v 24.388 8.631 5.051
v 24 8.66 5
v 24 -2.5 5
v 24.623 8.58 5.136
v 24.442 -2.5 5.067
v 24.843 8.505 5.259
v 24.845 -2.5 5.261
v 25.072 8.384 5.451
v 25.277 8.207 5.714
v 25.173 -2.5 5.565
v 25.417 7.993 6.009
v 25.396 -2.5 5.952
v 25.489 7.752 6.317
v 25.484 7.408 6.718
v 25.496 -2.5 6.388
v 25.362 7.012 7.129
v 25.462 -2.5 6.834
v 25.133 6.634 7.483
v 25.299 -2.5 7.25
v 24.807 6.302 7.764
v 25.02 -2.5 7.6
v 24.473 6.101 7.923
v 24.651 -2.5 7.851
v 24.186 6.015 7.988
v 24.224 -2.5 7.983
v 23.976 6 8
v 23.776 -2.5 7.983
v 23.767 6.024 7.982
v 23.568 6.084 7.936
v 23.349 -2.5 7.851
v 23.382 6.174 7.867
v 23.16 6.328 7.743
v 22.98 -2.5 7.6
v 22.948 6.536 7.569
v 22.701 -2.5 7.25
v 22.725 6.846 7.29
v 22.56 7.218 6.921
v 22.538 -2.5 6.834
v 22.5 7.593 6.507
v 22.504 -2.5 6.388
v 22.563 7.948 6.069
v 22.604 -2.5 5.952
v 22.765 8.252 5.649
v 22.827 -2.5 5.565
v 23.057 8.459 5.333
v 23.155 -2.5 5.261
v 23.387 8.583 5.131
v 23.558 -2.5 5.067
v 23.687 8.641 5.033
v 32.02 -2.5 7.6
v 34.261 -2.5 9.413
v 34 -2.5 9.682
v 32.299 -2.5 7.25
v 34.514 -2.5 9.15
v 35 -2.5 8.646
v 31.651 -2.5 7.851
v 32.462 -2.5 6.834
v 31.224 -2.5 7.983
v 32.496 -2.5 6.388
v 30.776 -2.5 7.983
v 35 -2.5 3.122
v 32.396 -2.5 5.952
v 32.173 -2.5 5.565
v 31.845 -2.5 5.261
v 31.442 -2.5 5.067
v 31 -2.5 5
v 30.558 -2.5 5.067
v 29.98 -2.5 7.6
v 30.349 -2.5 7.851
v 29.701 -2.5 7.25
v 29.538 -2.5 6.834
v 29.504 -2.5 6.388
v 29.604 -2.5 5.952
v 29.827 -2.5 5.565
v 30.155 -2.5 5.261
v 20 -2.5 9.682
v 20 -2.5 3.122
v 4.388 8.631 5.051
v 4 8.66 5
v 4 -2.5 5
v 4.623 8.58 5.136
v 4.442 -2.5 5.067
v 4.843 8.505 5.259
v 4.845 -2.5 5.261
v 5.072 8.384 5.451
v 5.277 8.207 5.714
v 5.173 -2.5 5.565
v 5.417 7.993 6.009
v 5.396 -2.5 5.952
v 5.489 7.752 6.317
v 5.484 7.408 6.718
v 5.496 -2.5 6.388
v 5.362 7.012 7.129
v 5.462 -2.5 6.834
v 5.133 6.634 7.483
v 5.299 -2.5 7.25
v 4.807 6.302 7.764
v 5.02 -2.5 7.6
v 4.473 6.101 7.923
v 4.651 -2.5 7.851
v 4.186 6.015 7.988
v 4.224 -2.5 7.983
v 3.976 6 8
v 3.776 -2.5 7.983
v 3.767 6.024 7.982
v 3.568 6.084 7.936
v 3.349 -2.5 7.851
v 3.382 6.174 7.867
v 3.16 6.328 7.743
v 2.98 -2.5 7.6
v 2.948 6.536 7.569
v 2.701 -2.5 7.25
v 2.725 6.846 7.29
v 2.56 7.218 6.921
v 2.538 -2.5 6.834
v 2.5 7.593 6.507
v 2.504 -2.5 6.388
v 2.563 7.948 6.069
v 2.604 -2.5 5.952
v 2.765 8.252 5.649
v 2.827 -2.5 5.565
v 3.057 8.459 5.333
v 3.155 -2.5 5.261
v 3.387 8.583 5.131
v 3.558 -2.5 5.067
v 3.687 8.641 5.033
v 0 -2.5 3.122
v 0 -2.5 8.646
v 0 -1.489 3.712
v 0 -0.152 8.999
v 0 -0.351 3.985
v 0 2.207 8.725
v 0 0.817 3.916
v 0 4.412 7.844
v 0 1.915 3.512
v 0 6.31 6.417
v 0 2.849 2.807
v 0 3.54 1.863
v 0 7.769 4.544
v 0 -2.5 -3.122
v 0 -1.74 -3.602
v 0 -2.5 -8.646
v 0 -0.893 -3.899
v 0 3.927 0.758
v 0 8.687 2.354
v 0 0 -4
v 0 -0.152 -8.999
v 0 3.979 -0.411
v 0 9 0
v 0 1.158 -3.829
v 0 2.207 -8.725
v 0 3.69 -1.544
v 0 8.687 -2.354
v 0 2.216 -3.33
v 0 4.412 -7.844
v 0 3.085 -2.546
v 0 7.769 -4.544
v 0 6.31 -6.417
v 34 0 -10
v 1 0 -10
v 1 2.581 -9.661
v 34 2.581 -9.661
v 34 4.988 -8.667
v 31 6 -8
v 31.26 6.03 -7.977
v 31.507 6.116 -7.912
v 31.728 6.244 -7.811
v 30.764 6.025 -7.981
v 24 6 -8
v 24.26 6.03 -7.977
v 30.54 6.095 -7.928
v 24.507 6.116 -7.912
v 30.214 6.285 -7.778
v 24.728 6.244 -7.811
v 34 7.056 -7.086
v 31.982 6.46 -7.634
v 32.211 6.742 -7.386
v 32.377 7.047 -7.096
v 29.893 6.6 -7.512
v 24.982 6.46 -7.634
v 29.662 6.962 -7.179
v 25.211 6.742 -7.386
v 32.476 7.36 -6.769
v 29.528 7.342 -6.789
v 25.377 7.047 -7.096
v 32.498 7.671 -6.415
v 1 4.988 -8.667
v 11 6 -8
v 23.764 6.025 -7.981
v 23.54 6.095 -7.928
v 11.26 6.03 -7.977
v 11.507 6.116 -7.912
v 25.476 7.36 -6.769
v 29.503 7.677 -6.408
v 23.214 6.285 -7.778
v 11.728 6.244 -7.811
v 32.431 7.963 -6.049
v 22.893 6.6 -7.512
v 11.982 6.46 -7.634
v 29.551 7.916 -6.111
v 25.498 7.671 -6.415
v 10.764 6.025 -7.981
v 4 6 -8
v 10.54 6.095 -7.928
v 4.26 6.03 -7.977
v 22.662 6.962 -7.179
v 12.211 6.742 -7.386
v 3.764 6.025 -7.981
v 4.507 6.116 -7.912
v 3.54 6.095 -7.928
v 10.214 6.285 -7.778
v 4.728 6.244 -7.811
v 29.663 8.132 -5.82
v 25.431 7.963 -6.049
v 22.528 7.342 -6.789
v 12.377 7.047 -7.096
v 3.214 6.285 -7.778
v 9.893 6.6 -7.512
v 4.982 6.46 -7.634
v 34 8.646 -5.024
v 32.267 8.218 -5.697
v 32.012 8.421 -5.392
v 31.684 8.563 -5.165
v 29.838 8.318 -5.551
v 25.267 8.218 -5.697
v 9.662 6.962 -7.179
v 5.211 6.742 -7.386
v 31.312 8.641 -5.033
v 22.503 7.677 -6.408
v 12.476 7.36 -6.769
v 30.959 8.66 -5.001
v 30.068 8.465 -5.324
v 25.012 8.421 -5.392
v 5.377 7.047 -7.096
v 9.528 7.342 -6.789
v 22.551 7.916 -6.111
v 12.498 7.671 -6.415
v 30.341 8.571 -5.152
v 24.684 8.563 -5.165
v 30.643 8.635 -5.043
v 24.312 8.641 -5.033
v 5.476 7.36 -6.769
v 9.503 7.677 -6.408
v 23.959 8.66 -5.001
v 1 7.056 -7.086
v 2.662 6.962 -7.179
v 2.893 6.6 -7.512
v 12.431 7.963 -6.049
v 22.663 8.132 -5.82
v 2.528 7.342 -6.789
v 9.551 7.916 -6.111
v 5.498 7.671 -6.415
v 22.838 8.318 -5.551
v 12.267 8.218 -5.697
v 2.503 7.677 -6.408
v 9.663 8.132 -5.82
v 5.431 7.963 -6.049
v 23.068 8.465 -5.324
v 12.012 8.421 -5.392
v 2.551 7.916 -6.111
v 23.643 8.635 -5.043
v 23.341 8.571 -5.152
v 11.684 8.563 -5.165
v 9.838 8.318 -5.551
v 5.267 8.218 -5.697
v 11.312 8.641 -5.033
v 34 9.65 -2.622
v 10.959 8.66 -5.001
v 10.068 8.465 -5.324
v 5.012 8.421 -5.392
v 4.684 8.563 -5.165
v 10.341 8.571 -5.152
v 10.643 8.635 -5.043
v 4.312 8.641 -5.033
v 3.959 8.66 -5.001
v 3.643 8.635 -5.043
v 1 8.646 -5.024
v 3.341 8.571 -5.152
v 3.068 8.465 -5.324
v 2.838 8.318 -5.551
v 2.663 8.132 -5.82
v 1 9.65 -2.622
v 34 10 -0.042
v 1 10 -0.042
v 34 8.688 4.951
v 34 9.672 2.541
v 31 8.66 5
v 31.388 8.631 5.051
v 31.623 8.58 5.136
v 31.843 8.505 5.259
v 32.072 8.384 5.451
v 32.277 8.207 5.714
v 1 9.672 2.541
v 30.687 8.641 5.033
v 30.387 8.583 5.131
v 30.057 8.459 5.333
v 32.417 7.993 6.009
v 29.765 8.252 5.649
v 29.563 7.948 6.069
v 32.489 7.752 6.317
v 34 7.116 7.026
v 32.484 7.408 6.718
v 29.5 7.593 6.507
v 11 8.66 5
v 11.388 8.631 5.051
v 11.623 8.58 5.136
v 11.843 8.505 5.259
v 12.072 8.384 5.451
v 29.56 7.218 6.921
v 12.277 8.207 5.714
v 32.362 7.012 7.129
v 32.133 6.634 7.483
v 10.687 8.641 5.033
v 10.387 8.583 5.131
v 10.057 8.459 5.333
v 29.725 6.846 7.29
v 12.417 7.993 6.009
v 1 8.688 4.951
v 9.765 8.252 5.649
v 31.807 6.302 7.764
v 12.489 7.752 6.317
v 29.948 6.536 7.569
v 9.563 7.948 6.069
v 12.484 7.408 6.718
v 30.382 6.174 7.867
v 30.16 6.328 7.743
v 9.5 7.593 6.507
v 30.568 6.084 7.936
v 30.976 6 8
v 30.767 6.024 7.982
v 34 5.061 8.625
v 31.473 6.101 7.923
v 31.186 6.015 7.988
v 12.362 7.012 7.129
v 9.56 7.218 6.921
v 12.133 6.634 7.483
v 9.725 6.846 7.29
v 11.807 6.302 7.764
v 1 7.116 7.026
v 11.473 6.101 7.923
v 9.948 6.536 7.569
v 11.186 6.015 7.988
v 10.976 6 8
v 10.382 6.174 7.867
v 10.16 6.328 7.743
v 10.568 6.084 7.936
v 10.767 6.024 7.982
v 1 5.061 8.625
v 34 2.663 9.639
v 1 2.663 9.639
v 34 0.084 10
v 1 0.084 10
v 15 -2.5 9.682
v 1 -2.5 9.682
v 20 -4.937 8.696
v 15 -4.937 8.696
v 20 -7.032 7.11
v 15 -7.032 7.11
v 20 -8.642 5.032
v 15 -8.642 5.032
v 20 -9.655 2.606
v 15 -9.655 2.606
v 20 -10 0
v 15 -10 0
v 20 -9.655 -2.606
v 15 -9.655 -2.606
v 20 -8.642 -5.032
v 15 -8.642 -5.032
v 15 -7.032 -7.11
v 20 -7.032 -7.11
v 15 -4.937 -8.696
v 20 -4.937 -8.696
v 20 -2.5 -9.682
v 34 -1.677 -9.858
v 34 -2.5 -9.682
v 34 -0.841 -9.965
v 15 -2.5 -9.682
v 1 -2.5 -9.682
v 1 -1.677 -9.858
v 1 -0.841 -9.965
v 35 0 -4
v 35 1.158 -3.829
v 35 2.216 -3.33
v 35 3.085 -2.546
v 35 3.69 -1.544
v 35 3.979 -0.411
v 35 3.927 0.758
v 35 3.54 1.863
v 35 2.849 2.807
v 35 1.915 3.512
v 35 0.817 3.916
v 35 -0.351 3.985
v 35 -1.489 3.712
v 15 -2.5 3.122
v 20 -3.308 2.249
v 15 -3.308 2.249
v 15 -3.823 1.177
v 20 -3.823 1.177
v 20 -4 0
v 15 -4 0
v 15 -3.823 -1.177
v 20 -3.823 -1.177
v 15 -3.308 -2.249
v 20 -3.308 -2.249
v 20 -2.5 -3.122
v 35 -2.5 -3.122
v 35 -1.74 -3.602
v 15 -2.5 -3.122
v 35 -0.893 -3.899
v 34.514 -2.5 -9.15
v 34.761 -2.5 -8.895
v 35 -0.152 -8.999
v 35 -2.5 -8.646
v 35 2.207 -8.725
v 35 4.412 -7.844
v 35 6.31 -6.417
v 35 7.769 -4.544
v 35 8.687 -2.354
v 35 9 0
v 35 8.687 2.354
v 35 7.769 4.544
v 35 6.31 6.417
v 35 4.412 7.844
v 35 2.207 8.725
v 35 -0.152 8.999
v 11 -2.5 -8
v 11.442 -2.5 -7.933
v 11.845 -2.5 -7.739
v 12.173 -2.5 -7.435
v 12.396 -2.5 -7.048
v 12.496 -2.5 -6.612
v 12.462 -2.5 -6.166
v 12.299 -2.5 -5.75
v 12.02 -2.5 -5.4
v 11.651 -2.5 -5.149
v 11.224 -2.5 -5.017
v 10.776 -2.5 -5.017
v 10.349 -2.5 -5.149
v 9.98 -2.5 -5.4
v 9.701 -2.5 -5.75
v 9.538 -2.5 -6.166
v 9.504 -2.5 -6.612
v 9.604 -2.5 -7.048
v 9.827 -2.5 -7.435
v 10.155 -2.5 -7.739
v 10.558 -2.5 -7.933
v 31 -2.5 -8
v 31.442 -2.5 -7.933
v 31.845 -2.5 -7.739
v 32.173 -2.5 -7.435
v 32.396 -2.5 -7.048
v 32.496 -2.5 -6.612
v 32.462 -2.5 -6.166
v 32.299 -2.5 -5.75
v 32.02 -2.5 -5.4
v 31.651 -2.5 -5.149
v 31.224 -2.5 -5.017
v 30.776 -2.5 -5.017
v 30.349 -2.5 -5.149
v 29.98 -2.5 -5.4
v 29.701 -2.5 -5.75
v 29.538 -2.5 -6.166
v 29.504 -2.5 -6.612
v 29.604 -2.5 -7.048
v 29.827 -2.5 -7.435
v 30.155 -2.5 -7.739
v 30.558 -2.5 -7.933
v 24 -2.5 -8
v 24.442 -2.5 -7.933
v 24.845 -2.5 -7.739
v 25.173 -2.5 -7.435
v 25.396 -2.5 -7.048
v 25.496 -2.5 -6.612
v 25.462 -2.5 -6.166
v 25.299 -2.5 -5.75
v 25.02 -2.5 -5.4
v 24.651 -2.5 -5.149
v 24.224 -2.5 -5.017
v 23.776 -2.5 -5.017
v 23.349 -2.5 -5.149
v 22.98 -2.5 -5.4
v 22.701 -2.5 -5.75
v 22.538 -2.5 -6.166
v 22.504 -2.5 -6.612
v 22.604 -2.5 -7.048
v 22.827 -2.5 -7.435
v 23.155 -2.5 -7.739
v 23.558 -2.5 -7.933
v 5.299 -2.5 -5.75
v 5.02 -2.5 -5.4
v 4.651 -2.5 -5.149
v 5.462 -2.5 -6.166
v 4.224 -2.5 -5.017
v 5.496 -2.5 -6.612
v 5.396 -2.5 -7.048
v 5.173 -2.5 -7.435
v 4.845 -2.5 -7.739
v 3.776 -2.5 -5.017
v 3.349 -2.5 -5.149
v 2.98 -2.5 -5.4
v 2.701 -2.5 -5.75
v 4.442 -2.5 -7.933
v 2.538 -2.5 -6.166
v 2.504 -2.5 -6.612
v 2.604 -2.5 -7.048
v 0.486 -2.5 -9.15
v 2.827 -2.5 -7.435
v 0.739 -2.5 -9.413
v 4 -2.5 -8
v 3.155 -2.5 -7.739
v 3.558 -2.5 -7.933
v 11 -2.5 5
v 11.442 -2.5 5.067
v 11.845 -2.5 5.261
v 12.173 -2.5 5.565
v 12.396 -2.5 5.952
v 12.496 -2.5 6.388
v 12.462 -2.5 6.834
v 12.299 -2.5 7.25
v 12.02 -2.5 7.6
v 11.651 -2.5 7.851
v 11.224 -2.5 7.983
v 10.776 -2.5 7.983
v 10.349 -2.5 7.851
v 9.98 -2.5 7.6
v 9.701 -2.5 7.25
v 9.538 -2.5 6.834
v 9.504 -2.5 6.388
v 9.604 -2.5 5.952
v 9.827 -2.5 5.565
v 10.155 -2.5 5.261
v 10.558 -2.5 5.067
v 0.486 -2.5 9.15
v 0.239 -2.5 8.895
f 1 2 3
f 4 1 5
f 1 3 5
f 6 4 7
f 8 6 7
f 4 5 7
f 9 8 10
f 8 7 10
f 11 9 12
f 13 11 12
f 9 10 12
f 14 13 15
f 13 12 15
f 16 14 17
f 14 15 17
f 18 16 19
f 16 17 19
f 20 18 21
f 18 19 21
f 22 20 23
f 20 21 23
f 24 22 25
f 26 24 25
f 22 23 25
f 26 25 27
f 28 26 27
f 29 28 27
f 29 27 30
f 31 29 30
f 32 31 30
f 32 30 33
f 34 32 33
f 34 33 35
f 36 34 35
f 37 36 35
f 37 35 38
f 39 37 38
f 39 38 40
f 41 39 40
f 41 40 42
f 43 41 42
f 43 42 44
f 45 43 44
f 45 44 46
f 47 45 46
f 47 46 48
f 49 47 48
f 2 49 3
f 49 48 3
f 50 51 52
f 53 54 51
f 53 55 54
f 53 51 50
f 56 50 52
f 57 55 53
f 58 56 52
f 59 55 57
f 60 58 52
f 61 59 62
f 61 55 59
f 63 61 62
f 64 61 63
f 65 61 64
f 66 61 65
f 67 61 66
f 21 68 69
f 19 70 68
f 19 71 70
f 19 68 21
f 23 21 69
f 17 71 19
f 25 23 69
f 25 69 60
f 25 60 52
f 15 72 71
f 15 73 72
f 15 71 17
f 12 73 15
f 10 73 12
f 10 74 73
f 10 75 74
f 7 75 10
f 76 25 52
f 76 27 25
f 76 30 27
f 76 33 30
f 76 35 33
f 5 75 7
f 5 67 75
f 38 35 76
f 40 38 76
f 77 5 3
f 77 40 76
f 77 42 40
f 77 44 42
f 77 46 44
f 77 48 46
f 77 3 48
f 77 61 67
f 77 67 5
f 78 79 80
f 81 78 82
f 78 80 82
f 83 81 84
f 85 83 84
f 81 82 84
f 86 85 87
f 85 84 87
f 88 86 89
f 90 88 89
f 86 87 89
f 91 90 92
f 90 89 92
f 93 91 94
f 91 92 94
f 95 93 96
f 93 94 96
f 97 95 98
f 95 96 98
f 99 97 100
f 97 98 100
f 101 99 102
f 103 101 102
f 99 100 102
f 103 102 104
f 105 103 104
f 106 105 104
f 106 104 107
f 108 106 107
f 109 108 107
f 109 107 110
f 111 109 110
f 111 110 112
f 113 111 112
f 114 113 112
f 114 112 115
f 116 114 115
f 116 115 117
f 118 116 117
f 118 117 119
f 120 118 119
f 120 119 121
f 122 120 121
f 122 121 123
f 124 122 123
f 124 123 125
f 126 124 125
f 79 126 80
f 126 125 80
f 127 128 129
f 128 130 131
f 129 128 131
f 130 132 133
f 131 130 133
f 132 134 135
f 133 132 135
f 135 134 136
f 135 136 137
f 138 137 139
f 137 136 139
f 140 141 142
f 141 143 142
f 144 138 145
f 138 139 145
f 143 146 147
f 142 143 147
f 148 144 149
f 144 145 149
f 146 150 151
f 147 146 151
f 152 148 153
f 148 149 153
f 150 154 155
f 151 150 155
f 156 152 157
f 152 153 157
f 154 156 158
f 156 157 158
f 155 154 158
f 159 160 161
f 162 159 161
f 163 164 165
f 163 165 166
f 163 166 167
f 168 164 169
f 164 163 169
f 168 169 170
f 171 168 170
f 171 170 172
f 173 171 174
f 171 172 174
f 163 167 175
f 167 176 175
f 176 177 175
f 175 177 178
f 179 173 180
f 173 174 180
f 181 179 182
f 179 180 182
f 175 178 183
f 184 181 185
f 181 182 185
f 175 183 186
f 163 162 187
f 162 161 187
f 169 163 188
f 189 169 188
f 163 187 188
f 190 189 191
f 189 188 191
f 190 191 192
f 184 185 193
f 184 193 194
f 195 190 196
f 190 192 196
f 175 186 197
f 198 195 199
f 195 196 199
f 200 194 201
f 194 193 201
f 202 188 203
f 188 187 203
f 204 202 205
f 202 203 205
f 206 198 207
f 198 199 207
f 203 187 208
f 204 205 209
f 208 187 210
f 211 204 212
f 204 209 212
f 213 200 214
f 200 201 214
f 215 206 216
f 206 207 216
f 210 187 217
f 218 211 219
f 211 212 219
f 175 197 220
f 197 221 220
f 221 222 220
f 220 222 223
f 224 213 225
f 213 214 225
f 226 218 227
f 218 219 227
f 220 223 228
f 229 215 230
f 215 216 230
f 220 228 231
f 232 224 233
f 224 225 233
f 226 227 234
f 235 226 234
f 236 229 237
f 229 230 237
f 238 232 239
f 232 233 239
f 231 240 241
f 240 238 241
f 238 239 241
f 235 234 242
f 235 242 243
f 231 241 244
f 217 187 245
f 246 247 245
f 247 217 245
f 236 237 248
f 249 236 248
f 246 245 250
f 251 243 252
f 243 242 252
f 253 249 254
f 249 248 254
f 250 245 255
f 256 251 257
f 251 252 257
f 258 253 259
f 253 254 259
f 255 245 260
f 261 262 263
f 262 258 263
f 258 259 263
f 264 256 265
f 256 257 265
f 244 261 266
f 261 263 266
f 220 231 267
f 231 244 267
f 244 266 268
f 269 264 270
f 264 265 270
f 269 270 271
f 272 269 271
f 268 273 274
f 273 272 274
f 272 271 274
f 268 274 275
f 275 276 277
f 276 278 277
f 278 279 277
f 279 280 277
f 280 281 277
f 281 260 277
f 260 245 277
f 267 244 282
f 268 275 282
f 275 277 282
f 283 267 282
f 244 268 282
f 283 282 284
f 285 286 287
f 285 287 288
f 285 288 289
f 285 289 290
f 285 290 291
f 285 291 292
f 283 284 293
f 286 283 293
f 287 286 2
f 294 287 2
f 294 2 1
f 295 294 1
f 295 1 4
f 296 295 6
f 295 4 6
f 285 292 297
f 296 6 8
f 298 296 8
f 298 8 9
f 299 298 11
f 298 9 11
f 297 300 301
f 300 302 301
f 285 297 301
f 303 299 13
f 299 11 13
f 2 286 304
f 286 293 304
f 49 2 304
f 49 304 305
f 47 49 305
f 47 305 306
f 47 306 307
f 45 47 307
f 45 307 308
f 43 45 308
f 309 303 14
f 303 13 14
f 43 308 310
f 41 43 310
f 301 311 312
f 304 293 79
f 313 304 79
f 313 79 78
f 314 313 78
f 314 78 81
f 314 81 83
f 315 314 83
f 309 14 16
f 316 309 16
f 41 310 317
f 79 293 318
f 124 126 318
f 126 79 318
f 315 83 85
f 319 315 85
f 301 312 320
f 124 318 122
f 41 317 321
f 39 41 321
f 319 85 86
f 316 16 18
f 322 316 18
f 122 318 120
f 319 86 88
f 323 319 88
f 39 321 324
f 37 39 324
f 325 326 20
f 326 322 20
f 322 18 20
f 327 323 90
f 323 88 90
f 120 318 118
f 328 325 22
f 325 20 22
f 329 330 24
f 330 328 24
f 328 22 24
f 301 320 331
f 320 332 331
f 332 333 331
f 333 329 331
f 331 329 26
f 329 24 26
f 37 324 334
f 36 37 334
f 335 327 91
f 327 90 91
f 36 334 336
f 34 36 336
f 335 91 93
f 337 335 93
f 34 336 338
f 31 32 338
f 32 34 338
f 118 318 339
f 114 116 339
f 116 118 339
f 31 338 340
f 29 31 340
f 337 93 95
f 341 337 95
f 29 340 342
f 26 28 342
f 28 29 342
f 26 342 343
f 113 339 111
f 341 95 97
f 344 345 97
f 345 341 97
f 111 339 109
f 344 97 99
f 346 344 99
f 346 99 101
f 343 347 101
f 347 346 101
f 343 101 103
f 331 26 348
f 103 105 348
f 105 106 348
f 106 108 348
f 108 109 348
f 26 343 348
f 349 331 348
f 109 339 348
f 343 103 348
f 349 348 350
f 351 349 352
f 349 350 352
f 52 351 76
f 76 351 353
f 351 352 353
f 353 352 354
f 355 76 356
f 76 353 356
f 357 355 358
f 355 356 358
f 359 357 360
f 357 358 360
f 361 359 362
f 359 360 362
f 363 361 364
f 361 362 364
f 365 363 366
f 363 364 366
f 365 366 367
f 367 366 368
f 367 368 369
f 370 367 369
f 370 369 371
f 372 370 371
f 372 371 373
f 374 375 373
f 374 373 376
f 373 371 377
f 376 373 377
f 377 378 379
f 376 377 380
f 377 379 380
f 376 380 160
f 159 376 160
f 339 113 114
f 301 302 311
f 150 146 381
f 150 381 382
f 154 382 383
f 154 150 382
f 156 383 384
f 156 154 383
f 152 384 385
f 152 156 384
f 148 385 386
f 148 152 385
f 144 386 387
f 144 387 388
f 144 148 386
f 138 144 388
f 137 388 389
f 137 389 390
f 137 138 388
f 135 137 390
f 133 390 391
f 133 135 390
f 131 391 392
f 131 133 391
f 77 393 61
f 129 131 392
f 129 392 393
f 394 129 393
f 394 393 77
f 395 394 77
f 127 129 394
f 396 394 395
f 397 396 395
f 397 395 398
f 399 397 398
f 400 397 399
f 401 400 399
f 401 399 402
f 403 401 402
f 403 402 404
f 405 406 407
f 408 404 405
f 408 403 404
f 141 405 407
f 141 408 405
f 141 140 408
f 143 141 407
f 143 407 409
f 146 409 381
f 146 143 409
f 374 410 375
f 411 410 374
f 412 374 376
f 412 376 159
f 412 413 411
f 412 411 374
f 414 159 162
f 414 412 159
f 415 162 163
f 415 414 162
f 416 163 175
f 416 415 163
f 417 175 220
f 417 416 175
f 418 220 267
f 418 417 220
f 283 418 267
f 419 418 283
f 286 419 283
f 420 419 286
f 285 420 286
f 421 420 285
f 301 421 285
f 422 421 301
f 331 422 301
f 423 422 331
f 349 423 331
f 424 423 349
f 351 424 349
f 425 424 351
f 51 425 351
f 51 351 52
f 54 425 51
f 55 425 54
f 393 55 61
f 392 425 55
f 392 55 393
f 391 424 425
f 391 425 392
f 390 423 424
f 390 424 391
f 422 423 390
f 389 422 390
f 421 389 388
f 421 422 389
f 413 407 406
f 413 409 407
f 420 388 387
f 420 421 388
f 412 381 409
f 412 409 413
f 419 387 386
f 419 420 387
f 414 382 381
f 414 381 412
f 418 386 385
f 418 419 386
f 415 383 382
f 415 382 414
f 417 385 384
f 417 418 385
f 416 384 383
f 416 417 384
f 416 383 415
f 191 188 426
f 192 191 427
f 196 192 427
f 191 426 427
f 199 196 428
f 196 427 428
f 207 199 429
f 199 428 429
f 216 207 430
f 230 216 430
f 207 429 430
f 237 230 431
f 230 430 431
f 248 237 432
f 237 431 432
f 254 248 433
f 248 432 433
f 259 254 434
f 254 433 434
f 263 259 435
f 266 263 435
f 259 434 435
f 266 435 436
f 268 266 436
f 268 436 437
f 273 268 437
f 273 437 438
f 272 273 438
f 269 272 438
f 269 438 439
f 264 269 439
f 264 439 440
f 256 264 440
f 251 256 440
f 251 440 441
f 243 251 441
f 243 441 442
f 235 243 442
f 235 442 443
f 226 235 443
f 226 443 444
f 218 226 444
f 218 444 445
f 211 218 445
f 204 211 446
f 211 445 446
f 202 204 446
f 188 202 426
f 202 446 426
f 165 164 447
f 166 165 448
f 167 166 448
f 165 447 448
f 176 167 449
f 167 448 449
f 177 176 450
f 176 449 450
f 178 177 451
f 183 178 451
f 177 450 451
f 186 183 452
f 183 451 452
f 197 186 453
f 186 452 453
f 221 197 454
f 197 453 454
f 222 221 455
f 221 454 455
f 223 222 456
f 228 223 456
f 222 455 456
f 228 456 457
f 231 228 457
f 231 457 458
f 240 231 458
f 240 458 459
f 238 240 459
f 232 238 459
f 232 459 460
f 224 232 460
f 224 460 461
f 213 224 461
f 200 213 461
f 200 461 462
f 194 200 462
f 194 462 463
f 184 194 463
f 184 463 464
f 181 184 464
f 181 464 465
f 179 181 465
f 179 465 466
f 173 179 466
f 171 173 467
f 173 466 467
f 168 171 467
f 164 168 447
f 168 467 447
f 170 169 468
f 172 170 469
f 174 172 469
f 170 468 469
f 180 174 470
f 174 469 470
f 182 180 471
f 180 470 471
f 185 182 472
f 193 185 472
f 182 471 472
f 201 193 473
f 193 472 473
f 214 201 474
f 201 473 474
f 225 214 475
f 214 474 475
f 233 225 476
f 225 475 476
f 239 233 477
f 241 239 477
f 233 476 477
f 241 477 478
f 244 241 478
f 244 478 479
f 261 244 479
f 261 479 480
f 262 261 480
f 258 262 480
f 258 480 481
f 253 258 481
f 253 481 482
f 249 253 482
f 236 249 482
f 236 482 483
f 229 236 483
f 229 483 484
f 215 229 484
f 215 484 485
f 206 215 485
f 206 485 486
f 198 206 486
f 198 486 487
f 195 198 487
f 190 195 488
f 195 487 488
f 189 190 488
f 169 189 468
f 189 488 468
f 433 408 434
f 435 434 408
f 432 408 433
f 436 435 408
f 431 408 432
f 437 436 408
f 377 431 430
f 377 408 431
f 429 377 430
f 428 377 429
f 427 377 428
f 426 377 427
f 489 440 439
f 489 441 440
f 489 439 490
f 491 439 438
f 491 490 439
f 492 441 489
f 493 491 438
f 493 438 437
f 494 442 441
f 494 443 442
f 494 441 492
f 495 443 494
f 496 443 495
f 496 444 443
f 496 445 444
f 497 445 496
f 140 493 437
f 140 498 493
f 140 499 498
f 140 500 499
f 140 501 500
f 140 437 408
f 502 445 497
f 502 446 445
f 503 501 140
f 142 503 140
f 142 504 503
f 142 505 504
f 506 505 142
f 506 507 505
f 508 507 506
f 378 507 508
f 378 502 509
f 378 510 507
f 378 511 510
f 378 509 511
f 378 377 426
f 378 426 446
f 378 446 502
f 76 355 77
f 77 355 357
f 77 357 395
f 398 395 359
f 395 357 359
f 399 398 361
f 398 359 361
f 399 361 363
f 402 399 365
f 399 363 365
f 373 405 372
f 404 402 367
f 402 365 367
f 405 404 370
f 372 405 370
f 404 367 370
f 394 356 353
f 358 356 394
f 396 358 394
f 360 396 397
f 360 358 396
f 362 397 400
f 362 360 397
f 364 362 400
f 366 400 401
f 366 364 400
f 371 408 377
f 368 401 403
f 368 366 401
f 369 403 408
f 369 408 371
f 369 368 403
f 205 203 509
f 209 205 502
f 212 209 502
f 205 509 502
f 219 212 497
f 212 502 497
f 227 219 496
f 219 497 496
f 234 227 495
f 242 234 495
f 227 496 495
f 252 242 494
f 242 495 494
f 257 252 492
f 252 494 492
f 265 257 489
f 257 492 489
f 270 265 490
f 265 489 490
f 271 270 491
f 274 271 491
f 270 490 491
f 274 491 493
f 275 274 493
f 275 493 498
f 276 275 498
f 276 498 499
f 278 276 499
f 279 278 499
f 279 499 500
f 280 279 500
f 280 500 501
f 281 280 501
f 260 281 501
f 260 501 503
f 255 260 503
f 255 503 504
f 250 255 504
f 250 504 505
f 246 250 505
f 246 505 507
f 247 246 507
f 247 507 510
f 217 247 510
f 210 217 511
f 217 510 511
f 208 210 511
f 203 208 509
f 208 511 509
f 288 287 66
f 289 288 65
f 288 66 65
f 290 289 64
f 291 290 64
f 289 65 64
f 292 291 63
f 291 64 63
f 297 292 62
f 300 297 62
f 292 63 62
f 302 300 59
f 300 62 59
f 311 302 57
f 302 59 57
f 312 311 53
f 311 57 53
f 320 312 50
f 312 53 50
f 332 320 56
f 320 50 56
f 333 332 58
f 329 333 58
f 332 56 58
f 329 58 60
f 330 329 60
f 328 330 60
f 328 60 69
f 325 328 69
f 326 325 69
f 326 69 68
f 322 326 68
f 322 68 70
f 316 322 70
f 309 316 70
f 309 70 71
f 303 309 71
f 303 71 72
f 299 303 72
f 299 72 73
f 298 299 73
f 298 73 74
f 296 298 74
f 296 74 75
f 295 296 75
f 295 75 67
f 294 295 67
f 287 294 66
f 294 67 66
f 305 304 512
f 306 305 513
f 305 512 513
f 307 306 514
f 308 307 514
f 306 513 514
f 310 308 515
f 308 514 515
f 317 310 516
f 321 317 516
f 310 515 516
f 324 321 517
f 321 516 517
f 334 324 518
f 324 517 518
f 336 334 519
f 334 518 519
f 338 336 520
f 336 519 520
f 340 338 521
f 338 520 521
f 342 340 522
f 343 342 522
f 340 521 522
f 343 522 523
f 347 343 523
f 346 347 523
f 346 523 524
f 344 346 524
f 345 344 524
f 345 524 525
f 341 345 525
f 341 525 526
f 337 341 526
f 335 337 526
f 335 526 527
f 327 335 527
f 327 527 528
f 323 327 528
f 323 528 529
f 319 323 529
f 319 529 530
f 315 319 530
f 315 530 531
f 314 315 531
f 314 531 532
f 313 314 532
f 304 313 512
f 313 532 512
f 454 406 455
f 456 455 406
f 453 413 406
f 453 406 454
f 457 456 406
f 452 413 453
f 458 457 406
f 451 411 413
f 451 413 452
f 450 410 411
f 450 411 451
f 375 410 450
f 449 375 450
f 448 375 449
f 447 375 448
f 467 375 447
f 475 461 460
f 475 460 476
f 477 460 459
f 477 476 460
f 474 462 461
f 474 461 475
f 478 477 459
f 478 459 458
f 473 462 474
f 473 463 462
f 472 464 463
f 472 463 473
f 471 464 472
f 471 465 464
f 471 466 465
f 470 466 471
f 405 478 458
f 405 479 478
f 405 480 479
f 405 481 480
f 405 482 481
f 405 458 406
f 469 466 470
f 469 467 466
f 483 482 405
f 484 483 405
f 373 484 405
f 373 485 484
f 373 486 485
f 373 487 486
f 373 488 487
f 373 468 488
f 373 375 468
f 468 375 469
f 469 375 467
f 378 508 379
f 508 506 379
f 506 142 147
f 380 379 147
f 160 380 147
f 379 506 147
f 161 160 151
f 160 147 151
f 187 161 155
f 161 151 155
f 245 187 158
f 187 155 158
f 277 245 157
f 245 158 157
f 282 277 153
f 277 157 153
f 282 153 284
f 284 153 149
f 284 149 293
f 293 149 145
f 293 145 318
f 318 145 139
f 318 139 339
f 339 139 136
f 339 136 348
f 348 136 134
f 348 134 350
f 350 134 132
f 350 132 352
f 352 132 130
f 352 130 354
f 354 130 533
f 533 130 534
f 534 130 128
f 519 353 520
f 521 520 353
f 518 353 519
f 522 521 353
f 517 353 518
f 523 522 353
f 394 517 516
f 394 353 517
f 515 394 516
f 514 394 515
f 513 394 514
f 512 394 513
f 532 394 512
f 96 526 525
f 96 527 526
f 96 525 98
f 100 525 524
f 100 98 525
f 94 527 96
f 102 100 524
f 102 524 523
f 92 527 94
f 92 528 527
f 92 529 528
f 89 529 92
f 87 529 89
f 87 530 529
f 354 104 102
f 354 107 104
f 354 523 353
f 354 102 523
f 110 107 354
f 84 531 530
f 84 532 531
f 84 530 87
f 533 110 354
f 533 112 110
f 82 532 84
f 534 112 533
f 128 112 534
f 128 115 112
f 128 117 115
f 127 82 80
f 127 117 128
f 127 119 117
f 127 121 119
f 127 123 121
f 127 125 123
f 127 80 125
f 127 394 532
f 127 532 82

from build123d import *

# Parameters (mm, degrees)
SKETCH_1_R          = 10
SKETCH_1_R_2        = 4
EXTRUDE_1_DEPTH     = 35
CHAMFER_1_SIZE      = 1
SKETCH_3_W          = 15
SKETCH_3_H          = 20
CUT_EXTRUDE_1_DEPTH = 7.5
SKETCH_3_4_R        = 1.5
CUT_EXTRUDE_2_DEPTH = 42.533119315


with BuildPart() as part:
    # 草图1 → 凸台-拉伸1 (new body)
    with BuildSketch(Plane(origin=(0, 0, 0), x_dir=(0, 0, -1), z_dir=(1, 0, 0))):
        Circle(SKETCH_1_R)
        Circle(SKETCH_1_R_2, mode=Mode.SUBTRACT)
    extrude(amount=EXTRUDE_1_DEPTH)

    # 倒角1
    chamfer_1_edges = [part.edges().sort_by_distance(p)[0] for p in [
        (35, 0, 10),
        (0, 0, 10),
    ]]
    chamfer(chamfer_1_edges, length=CHAMFER_1_SIZE)

    # 草图3 → 切除-拉伸1 (cut)
    with BuildSketch(Plane(origin=(0, -10, 0), x_dir=(-1, 0, 0), z_dir=(0, -1, 0))):
        with Locations((-7.5, 0)):
            Rectangle(SKETCH_3_W, SKETCH_3_H)
        with Locations((-27.5, 0)):
            Rectangle(SKETCH_3_W, SKETCH_3_H)
    extrude(amount=-CUT_EXTRUDE_1_DEPTH, mode=Mode.SUBTRACT)

    # 草图3<4> → 切除-拉伸2 (cut, through all)
    with BuildSketch(Plane(origin=(0, -10, 0), x_dir=(-1, 0, 0), z_dir=(0, -1, 0))):
        with Locations((-4, 6.5)):
            Circle(SKETCH_3_4_R)
        with Locations((-11, 6.5)):
            Circle(SKETCH_3_4_R)
        with Locations((-11, -6.5)):
            Circle(SKETCH_3_4_R)
        with Locations((-4, -6.5)):
            Circle(SKETCH_3_4_R)
        with Locations((-31, -6.5)):
            Circle(SKETCH_3_4_R)
        with Locations((-24, -6.5)):
            Circle(SKETCH_3_4_R)
        with Locations((-24, 6.5)):
            Circle(SKETCH_3_4_R)
        with Locations((-31, 6.5)):
            Circle(SKETCH_3_4_R)
    extrude(amount=-CUT_EXTRUDE_2_DEPTH, mode=Mode.SUBTRACT)


solid = part.part
